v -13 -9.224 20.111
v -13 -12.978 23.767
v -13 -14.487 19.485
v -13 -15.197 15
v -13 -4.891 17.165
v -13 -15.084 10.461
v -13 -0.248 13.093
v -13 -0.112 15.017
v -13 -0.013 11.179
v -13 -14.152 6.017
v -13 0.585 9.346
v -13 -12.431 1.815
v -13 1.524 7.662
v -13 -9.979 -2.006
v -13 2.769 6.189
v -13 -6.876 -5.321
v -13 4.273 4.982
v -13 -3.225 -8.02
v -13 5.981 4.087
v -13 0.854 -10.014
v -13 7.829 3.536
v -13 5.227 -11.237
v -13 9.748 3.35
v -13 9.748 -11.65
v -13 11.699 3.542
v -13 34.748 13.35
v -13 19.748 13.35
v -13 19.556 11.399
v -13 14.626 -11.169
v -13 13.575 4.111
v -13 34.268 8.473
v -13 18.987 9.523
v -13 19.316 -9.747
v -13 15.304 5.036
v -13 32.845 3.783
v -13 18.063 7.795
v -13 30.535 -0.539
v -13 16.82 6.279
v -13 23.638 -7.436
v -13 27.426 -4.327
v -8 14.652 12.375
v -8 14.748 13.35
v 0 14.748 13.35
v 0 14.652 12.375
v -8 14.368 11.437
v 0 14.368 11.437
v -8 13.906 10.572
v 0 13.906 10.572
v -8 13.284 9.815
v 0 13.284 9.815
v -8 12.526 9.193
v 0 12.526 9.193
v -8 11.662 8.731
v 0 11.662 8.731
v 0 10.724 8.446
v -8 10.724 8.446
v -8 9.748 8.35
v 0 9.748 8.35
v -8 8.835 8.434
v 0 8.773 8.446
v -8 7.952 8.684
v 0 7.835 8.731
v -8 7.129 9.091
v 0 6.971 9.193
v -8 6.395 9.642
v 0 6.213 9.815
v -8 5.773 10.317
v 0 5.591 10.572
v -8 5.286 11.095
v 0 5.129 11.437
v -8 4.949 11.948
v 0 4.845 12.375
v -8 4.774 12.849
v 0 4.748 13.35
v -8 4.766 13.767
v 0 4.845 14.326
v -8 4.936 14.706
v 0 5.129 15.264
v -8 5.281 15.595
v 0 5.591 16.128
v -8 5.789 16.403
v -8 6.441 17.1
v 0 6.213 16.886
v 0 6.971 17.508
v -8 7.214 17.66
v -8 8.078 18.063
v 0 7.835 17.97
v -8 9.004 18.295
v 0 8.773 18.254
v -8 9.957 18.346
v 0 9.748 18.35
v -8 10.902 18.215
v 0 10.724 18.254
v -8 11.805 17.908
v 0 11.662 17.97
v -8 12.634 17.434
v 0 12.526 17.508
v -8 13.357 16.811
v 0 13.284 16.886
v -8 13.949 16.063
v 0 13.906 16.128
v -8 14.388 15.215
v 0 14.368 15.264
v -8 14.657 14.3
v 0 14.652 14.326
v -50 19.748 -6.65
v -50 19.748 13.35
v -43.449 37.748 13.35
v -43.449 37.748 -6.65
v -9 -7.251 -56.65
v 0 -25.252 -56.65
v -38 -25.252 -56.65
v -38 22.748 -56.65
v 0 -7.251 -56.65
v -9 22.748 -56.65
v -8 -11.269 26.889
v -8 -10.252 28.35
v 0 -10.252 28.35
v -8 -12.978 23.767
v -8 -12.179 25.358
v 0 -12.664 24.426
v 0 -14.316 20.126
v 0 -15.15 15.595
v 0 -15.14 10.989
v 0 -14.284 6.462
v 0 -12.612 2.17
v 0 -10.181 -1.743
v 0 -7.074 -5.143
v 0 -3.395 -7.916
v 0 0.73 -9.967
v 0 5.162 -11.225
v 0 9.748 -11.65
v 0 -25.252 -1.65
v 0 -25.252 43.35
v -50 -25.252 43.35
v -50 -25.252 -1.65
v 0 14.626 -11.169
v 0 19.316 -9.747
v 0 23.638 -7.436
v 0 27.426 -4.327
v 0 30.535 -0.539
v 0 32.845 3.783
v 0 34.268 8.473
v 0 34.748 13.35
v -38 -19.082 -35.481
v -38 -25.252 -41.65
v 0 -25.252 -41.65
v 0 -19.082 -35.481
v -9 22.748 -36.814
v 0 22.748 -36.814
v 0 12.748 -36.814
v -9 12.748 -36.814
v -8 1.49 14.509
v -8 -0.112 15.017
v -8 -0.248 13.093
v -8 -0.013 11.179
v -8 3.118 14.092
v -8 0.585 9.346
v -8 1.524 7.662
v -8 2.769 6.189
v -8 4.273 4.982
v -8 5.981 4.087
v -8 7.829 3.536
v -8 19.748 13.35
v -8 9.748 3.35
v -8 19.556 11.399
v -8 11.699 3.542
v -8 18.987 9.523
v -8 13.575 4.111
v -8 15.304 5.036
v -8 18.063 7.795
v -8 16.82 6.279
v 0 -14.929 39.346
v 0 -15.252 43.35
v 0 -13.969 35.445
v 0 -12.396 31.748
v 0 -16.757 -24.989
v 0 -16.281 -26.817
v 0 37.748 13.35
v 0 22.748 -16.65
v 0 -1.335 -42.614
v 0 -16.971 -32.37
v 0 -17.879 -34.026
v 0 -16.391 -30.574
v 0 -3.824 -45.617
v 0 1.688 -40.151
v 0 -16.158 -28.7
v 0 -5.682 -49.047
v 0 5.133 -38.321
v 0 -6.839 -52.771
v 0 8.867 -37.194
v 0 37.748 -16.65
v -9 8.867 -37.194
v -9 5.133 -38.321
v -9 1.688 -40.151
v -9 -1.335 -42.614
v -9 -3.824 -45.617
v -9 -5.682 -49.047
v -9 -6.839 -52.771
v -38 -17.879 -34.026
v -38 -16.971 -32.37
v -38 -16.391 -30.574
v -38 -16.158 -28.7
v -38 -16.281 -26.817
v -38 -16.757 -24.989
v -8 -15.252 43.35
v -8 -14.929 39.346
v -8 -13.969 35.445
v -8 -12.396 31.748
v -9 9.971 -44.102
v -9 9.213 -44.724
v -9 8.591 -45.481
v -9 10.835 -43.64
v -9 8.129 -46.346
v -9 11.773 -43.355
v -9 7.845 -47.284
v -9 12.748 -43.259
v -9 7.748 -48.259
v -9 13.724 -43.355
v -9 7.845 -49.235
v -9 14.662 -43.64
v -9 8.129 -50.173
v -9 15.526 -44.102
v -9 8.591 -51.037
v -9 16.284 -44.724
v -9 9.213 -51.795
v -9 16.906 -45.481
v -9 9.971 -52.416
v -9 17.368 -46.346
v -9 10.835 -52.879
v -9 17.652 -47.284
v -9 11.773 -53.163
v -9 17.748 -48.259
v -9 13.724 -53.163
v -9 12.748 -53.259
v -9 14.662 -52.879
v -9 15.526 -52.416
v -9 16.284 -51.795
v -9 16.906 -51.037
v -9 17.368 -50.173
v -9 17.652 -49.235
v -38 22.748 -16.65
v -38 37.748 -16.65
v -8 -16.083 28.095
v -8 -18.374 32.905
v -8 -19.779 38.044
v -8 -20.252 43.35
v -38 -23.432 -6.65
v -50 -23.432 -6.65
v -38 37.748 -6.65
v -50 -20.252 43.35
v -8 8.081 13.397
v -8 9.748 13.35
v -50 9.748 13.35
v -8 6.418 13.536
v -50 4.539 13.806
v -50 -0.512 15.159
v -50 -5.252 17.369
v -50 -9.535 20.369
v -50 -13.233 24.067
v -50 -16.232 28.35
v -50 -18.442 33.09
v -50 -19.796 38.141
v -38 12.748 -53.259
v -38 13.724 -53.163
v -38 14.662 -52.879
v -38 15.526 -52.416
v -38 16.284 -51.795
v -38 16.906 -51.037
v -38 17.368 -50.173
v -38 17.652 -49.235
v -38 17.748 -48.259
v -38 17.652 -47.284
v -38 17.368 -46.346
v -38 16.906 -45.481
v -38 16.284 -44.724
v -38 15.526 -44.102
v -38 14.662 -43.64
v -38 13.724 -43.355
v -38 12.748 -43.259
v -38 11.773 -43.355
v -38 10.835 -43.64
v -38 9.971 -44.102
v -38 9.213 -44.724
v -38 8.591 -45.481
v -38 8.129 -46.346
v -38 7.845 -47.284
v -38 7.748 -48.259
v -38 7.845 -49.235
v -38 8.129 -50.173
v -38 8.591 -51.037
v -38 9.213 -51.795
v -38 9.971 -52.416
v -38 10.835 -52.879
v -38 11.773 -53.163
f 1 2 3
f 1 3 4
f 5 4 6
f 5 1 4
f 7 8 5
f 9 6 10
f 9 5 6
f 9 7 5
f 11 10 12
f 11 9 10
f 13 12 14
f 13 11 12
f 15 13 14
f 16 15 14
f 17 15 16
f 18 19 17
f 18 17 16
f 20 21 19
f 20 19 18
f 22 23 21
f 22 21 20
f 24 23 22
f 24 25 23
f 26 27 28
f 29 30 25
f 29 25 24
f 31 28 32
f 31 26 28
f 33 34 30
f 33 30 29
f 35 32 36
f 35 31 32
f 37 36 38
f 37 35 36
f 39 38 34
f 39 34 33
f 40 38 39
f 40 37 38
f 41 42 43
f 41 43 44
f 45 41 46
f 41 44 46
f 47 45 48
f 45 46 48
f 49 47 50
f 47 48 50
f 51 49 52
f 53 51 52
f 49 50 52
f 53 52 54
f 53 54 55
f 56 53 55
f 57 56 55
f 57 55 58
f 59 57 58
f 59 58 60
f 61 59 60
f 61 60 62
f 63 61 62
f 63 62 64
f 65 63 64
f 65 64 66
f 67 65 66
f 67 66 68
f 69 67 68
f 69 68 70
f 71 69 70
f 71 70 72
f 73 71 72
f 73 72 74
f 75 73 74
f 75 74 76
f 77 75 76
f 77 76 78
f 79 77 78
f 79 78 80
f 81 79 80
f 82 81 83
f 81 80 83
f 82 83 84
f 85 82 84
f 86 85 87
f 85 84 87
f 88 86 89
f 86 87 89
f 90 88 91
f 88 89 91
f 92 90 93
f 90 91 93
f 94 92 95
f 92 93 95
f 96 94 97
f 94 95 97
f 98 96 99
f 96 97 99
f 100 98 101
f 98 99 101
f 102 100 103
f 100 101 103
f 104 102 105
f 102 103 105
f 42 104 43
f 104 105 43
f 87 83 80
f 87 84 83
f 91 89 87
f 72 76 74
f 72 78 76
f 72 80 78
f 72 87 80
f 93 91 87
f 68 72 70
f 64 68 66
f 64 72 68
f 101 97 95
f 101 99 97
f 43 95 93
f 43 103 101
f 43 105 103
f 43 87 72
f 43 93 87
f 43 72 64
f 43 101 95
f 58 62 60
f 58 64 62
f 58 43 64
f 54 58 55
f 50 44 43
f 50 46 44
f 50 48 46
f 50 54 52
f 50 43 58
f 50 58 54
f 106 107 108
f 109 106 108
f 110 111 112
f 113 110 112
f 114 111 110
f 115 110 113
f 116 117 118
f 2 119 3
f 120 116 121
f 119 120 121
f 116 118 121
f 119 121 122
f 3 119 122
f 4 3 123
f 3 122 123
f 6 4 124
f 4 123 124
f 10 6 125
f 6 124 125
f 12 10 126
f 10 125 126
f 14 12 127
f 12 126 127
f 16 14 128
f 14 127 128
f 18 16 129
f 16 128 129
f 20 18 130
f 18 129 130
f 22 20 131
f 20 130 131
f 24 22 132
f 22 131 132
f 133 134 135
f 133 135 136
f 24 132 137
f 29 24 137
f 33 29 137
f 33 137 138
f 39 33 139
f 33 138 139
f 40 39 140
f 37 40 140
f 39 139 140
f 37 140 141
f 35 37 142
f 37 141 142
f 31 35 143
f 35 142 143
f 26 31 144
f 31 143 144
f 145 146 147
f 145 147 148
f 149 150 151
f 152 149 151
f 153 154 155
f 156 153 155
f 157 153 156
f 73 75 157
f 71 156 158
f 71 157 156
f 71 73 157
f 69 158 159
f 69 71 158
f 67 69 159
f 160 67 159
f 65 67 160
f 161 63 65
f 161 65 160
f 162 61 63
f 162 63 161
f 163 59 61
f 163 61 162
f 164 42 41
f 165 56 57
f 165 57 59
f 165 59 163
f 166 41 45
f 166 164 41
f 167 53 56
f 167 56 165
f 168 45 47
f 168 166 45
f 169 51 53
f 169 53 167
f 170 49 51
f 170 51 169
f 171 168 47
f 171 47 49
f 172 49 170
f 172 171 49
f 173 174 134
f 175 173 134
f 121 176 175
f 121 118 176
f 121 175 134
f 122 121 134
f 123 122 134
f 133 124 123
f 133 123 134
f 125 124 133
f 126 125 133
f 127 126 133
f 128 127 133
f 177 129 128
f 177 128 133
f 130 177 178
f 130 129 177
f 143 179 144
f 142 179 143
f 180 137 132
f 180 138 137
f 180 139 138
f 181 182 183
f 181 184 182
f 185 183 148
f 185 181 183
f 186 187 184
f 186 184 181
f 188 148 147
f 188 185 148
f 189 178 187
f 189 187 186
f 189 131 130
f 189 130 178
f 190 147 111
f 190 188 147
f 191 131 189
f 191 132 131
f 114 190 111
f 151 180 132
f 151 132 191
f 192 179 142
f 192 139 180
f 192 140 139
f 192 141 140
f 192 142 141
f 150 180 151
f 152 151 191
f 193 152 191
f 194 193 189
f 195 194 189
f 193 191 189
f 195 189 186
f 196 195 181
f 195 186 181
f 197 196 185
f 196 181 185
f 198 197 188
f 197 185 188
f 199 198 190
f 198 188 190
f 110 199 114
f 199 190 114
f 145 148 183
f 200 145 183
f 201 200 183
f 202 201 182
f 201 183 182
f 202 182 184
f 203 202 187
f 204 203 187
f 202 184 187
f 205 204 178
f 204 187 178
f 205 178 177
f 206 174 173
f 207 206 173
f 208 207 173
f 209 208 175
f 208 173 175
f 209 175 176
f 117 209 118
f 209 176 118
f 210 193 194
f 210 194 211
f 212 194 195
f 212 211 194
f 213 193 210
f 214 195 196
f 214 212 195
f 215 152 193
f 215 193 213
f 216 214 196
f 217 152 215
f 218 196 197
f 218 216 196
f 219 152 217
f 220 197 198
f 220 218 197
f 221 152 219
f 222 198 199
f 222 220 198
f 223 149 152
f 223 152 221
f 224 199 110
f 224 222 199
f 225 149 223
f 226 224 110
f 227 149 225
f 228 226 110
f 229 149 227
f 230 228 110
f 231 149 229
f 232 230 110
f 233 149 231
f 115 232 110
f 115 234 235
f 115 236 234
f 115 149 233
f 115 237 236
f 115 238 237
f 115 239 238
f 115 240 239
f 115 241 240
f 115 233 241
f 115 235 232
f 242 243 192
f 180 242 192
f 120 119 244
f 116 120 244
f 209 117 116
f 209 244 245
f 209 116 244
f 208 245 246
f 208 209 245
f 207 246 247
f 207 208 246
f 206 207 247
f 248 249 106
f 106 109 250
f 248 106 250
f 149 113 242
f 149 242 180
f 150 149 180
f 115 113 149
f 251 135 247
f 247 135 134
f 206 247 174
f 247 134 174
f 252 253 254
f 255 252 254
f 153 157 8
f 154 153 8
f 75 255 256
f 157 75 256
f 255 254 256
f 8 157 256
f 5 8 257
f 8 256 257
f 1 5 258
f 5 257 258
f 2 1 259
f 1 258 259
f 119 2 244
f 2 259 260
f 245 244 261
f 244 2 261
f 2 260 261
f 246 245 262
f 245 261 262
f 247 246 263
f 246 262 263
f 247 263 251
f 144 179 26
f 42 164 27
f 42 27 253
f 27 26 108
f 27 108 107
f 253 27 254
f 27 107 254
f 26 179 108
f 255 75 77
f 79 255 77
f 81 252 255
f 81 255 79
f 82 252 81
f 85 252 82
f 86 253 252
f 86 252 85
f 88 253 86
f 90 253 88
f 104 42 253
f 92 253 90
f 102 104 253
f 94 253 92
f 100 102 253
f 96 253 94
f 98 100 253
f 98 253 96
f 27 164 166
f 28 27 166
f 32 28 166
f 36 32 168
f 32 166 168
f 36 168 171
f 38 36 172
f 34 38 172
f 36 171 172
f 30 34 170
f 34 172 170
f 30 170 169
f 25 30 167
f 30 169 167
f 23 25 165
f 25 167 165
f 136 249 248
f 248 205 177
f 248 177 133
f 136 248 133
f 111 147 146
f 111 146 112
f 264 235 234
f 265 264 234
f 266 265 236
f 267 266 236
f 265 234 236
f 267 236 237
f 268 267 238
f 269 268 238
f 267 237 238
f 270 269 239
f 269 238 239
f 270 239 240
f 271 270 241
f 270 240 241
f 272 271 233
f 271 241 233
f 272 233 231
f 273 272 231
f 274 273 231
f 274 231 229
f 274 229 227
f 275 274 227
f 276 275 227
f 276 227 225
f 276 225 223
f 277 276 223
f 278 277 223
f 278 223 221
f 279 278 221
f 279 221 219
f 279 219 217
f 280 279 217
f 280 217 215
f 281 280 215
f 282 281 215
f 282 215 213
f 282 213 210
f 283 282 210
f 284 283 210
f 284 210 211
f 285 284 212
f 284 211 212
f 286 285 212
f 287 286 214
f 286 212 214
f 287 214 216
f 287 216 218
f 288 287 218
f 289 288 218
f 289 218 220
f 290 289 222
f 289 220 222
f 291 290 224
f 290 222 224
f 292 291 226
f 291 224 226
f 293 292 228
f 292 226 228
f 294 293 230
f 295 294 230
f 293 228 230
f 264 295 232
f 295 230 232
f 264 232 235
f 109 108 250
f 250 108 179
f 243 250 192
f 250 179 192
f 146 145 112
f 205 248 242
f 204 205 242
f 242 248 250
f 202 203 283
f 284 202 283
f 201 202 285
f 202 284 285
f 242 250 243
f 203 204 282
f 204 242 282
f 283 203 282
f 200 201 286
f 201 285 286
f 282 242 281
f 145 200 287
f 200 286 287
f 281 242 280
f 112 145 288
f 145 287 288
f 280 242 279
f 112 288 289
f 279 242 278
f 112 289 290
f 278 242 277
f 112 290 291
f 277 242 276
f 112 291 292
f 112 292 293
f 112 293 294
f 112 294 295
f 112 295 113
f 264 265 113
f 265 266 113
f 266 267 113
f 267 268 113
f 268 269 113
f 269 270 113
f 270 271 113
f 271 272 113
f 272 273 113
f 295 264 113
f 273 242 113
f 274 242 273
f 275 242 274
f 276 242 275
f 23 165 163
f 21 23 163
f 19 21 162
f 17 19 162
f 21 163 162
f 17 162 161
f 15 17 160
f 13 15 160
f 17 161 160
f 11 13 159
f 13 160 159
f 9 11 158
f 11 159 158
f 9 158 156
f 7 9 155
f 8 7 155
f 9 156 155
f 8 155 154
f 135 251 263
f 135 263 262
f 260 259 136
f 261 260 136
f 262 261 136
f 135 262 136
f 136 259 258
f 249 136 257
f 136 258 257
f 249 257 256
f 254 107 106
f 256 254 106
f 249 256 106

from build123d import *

# Parameters (mm, degrees)
SKETCH1_W           = 100
SKETCH1_H           = 63
BOSS_EXTRUDE1_DEPTH = 50
SKETCH2_W           = 50
SKETCH2_H           = 40
CUT_EXTRUDE1_DEPTH  = 15
SKETCH3_W           = 12
SKETCH3_H           = 10
CUT_EXTRUDE2_DEPTH  = 15
CUT_EXTRUDE3_DEPTH  = 9
SKETCH5_R           = 5
CUT_EXTRUDE4_DEPTH  = 42
CUT_EXTRUDE5_DEPTH  = 51
CUT_EXTRUDE6_DEPTH  = 42
CUT_EXTRUDE10_DEPTH = 51
CUT_EXTRUDE16_DEPTH = 13
CUT_EXTRUDE17_DEPTH = 8
SKETCH11_10_R       = 5
BOSS_EXTRUDE5_DEPTH = 8
CUT_EXTRUDE18_DEPTH = 20
CUT_EXTRUDE22_DEPTH = 8
SKETCH16_W          = 12
SKETCH16_H          = 50
CUT_EXTRUDE23_DEPTH = 49


with BuildPart() as part:
    # Sketch1 → Boss-Extrude1 (new body)
    with BuildSketch(Plane(origin=(0, 0, 0), x_dir=(0, 0, -1), z_dir=(1, 0, 0))):
        with Locations((6.649757701, 6.248490946)):
            Rectangle(SKETCH1_W, SKETCH1_H)
    extrude(amount=-BOSS_EXTRUDE1_DEPTH)

    # Sketch2 → Cut-Extrude1 (cut)
    with BuildSketch(Plane(origin=(0, 37.748490946, 0), x_dir=(1, 0, 0), z_dir=(0, 1, 0))):
        with Locations((-25, 36.649757701)):
            Rectangle(SKETCH2_W, SKETCH2_H)
    extrude(amount=-CUT_EXTRUDE1_DEPTH, mode=Mode.SUBTRACT)

    # Sketch3 → Cut-Extrude2 (cut)
    with BuildSketch(Plane(origin=(0, 37.748490946, 0), x_dir=(1, 0, 0), z_dir=(0, 1, 0))):
        with Locations((-44, 11.649757701)):
            Rectangle(SKETCH3_W, SKETCH3_H)
    extrude(amount=-CUT_EXTRUDE2_DEPTH, mode=Mode.SUBTRACT)

    # Sketch4 → Cut-Extrude3 (cut)
    with BuildSketch(Plane(origin=(0, 0, 0), x_dir=(0, 0, -1), z_dir=(1, 0, 0))):
        with BuildLine():
            Line((36.814050896, 22.748490946), (36.814050896, 12.748490946))
            ThreePointArc((36.814050896, 12.748490946), (42.613947659, -1.335438479), (56.649757701, -7.250834237))
            Line((56.649757701, -7.250834237), (56.649757701, 22.748490946))
            Line((56.649757701, 22.748490946), (36.814050896, 22.748490946))
        make_face()
    extrude(amount=-CUT_EXTRUDE3_DEPTH, mode=Mode.SUBTRACT)

    # Sketch5 → Cut-Extrude4 (cut, through all)
    with BuildSketch(Plane(origin=(-9, 0, 0), x_dir=(0, 0, -1), z_dir=(1, 0, 0))):
        with Locations((48.259112346, 12.748490946)):
            Circle(SKETCH5_R)
    extrude(amount=-CUT_EXTRUDE4_DEPTH, mode=Mode.SUBTRACT)

    # Sketch6 → Cut-Extrude5 (cut, through all)
    with BuildSketch(Plane(origin=(0, 0, 0), x_dir=(0, 0, -1), z_dir=(1, 0, 0))):
        with BuildLine():
            Line((41.649757701, -25.251509054), (35.480677879, -19.082429233))
            ThreePointArc((35.480677879, -19.082429233), (30.574006207, -16.390536973), (24.989408634, -16.756570837))
            Line((24.989408634, -16.756570837), (1.649757701, -25.251509054))
            Line((1.649757701, -25.251509054), (41.649757701, -25.251509054))
        make_face()
    extrude(amount=-CUT_EXTRUDE5_DEPTH, mode=Mode.SUBTRACT)

    # Sketch8 → Cut-Extrude6 (cut)
    with BuildSketch(Plane.ZY.offset(50)):
        with BuildLine():
            Line((43.350242299, -20.251509054), (43.350242299, 9.748490946))
            Line((43.350242299, 9.748490946), (13.350242299, 9.748490946))
            ThreePointArc((13.350242299, 9.748490946), (22.137038863, -11.46471249), (43.350242299, -20.251509054))
        make_face()
    extrude(amount=-CUT_EXTRUDE6_DEPTH, mode=Mode.SUBTRACT)

    # Sketch8<5> → Cut-Extrude10 (cut, through all)
    with BuildSketch(Plane.ZY.offset(50)):
        Polygon((13.350242299, 9.748490946), (43.350242299, 9.748490946), (43.350242299, 37.748490946), (36.798778082, 37.748490946), (13.350242299, 37.748490946), align=None)
    extrude(amount=-CUT_EXTRUDE10_DEPTH, mode=Mode.SUBTRACT)

    # Sketch11 → Cut-Extrude16 (cut)
    with BuildSketch(Plane(origin=(0, 0, 0), x_dir=(0, 0, -1), z_dir=(1, 0, 0))):
        with BuildLine():
            ThreePointArc((-23.350242299, 9.748490946), (-20.421310111, 16.819558758), (-13.350242299, 19.748490946))
            Line((-13.350242299, 19.748490946), (-13.350242299, 34.748490946))
            ThreePointArc((-13.350242299, 34.748490946), (-31.027911829, 27.426160475), (-38.350242299, 9.748490946))
            Line((-38.350242299, 9.748490946), (-23.350242299, 9.748490946))
        make_face()
        with BuildLine():
            Line((-13.350242299, 34.748490946), (-13.350242299, 19.748490946))
            ThreePointArc((-13.350242299, 19.748490946), (-6.279174487, 16.819558758), (-3.350242299, 9.748490946))
            ThreePointArc((-3.350242299, 9.748490946), (-13.350242299, -0.251509054), (-23.350242299, 9.748490946))
            Line((-23.350242299, 9.748490946), (-38.350242299, 9.748490946))
            ThreePointArc((-38.350242299, 9.748490946), (-35.710922074, -1.431848942), (-28.350242299, -10.251509054))
            ThreePointArc((-28.350242299, -10.251509054), (-2.169902411, -12.612188829), (11.649757701, 9.748490946))
            ThreePointArc((11.649757701, 9.748490946), (4.327427231, 27.426160475), (-13.350242299, 34.748490946))
        make_face()
    extrude(amount=-CUT_EXTRUDE16_DEPTH, mode=Mode.SUBTRACT)

    # Sketch11<8> → Cut-Extrude17 (cut)
    with BuildSketch(Plane(origin=(0, 0, 0), x_dir=(0, 0, -1), z_dir=(1, 0, 0))):
        with BuildLine():
            ThreePointArc((-3.350242299, 9.748490946), (-6.279174487, 16.819558758), (-13.350242299, 19.748490946))
            Line((-13.350242299, 19.748490946), (-13.350242299, 14.748490946))
            ThreePointArc((-13.350242299, 14.748490946), (-9.814708393, 13.284024852), (-8.350242299, 9.748490946))
            ThreePointArc((-8.350242299, 9.748490946), (-13.350242299, 4.748490946), (-18.350242299, 9.748490946))
            Line((-18.350242299, 9.748490946), (-23.350242299, 9.748490946))
            ThreePointArc((-23.350242299, 9.748490946), (-13.350242299, -0.251509054), (-3.350242299, 9.748490946))
        make_face()
    extrude(amount=-CUT_EXTRUDE17_DEPTH, mode=Mode.SUBTRACT)

    # Sketch11<10> → Boss-Extrude5 (add)
    with BuildSketch(Plane(origin=(0, 0, 0), x_dir=(0, 0, -1), z_dir=(1, 0, 0))):
        with Locations((-13.350242299, 9.748490946)):
            Circle(SKETCH11_10_R)
    extrude(amount=-BOSS_EXTRUDE5_DEPTH)

    # Sketch14 → Cut-Extrude18 (cut)
    with BuildSketch(Plane.XY.offset(13.350242299)):
        Polygon((-50, 19.748490946), (-43.448535783, 37.748490946), (-50, 37.748490946), align=None)
    extrude(amount=-CUT_EXTRUDE18_DEPTH, mode=Mode.SUBTRACT)

    # Sketch11<11> → Cut-Extrude22 (cut)
    with BuildSketch(Plane(origin=(0, 0, 0), x_dir=(0, 0, -1), z_dir=(1, 0, 0))):
        with BuildLine():
            ThreePointArc((-28.350242299, -10.251509054), (-35.710922074, -1.431848942), (-38.350242299, 9.748490946))
            Line((-38.350242299, 9.748490946), (-43.350242299, 9.748490946))
            Line((-43.350242299, 9.748490946), (-43.350242299, -15.251509054))
            ThreePointArc((-43.350242299, -15.251509054), (-35.444548148, -13.968591506), (-28.350242299, -10.251509054))
        make_face()
    extrude(amount=-CUT_EXTRUDE22_DEPTH, mode=Mode.SUBTRACT)

    # Sketch16 → Cut-Extrude23 (cut, through all)
    with BuildSketch(Plane(origin=(0, 22.748490946, 0), x_dir=(1, 0, 0), z_dir=(0, 1, 0))):
        with Locations((-44, 31.649757701)):
            Rectangle(SKETCH16_W, SKETCH16_H)
    extrude(amount=-CUT_EXTRUDE23_DEPTH, mode=Mode.SUBTRACT)


solid = part.part
